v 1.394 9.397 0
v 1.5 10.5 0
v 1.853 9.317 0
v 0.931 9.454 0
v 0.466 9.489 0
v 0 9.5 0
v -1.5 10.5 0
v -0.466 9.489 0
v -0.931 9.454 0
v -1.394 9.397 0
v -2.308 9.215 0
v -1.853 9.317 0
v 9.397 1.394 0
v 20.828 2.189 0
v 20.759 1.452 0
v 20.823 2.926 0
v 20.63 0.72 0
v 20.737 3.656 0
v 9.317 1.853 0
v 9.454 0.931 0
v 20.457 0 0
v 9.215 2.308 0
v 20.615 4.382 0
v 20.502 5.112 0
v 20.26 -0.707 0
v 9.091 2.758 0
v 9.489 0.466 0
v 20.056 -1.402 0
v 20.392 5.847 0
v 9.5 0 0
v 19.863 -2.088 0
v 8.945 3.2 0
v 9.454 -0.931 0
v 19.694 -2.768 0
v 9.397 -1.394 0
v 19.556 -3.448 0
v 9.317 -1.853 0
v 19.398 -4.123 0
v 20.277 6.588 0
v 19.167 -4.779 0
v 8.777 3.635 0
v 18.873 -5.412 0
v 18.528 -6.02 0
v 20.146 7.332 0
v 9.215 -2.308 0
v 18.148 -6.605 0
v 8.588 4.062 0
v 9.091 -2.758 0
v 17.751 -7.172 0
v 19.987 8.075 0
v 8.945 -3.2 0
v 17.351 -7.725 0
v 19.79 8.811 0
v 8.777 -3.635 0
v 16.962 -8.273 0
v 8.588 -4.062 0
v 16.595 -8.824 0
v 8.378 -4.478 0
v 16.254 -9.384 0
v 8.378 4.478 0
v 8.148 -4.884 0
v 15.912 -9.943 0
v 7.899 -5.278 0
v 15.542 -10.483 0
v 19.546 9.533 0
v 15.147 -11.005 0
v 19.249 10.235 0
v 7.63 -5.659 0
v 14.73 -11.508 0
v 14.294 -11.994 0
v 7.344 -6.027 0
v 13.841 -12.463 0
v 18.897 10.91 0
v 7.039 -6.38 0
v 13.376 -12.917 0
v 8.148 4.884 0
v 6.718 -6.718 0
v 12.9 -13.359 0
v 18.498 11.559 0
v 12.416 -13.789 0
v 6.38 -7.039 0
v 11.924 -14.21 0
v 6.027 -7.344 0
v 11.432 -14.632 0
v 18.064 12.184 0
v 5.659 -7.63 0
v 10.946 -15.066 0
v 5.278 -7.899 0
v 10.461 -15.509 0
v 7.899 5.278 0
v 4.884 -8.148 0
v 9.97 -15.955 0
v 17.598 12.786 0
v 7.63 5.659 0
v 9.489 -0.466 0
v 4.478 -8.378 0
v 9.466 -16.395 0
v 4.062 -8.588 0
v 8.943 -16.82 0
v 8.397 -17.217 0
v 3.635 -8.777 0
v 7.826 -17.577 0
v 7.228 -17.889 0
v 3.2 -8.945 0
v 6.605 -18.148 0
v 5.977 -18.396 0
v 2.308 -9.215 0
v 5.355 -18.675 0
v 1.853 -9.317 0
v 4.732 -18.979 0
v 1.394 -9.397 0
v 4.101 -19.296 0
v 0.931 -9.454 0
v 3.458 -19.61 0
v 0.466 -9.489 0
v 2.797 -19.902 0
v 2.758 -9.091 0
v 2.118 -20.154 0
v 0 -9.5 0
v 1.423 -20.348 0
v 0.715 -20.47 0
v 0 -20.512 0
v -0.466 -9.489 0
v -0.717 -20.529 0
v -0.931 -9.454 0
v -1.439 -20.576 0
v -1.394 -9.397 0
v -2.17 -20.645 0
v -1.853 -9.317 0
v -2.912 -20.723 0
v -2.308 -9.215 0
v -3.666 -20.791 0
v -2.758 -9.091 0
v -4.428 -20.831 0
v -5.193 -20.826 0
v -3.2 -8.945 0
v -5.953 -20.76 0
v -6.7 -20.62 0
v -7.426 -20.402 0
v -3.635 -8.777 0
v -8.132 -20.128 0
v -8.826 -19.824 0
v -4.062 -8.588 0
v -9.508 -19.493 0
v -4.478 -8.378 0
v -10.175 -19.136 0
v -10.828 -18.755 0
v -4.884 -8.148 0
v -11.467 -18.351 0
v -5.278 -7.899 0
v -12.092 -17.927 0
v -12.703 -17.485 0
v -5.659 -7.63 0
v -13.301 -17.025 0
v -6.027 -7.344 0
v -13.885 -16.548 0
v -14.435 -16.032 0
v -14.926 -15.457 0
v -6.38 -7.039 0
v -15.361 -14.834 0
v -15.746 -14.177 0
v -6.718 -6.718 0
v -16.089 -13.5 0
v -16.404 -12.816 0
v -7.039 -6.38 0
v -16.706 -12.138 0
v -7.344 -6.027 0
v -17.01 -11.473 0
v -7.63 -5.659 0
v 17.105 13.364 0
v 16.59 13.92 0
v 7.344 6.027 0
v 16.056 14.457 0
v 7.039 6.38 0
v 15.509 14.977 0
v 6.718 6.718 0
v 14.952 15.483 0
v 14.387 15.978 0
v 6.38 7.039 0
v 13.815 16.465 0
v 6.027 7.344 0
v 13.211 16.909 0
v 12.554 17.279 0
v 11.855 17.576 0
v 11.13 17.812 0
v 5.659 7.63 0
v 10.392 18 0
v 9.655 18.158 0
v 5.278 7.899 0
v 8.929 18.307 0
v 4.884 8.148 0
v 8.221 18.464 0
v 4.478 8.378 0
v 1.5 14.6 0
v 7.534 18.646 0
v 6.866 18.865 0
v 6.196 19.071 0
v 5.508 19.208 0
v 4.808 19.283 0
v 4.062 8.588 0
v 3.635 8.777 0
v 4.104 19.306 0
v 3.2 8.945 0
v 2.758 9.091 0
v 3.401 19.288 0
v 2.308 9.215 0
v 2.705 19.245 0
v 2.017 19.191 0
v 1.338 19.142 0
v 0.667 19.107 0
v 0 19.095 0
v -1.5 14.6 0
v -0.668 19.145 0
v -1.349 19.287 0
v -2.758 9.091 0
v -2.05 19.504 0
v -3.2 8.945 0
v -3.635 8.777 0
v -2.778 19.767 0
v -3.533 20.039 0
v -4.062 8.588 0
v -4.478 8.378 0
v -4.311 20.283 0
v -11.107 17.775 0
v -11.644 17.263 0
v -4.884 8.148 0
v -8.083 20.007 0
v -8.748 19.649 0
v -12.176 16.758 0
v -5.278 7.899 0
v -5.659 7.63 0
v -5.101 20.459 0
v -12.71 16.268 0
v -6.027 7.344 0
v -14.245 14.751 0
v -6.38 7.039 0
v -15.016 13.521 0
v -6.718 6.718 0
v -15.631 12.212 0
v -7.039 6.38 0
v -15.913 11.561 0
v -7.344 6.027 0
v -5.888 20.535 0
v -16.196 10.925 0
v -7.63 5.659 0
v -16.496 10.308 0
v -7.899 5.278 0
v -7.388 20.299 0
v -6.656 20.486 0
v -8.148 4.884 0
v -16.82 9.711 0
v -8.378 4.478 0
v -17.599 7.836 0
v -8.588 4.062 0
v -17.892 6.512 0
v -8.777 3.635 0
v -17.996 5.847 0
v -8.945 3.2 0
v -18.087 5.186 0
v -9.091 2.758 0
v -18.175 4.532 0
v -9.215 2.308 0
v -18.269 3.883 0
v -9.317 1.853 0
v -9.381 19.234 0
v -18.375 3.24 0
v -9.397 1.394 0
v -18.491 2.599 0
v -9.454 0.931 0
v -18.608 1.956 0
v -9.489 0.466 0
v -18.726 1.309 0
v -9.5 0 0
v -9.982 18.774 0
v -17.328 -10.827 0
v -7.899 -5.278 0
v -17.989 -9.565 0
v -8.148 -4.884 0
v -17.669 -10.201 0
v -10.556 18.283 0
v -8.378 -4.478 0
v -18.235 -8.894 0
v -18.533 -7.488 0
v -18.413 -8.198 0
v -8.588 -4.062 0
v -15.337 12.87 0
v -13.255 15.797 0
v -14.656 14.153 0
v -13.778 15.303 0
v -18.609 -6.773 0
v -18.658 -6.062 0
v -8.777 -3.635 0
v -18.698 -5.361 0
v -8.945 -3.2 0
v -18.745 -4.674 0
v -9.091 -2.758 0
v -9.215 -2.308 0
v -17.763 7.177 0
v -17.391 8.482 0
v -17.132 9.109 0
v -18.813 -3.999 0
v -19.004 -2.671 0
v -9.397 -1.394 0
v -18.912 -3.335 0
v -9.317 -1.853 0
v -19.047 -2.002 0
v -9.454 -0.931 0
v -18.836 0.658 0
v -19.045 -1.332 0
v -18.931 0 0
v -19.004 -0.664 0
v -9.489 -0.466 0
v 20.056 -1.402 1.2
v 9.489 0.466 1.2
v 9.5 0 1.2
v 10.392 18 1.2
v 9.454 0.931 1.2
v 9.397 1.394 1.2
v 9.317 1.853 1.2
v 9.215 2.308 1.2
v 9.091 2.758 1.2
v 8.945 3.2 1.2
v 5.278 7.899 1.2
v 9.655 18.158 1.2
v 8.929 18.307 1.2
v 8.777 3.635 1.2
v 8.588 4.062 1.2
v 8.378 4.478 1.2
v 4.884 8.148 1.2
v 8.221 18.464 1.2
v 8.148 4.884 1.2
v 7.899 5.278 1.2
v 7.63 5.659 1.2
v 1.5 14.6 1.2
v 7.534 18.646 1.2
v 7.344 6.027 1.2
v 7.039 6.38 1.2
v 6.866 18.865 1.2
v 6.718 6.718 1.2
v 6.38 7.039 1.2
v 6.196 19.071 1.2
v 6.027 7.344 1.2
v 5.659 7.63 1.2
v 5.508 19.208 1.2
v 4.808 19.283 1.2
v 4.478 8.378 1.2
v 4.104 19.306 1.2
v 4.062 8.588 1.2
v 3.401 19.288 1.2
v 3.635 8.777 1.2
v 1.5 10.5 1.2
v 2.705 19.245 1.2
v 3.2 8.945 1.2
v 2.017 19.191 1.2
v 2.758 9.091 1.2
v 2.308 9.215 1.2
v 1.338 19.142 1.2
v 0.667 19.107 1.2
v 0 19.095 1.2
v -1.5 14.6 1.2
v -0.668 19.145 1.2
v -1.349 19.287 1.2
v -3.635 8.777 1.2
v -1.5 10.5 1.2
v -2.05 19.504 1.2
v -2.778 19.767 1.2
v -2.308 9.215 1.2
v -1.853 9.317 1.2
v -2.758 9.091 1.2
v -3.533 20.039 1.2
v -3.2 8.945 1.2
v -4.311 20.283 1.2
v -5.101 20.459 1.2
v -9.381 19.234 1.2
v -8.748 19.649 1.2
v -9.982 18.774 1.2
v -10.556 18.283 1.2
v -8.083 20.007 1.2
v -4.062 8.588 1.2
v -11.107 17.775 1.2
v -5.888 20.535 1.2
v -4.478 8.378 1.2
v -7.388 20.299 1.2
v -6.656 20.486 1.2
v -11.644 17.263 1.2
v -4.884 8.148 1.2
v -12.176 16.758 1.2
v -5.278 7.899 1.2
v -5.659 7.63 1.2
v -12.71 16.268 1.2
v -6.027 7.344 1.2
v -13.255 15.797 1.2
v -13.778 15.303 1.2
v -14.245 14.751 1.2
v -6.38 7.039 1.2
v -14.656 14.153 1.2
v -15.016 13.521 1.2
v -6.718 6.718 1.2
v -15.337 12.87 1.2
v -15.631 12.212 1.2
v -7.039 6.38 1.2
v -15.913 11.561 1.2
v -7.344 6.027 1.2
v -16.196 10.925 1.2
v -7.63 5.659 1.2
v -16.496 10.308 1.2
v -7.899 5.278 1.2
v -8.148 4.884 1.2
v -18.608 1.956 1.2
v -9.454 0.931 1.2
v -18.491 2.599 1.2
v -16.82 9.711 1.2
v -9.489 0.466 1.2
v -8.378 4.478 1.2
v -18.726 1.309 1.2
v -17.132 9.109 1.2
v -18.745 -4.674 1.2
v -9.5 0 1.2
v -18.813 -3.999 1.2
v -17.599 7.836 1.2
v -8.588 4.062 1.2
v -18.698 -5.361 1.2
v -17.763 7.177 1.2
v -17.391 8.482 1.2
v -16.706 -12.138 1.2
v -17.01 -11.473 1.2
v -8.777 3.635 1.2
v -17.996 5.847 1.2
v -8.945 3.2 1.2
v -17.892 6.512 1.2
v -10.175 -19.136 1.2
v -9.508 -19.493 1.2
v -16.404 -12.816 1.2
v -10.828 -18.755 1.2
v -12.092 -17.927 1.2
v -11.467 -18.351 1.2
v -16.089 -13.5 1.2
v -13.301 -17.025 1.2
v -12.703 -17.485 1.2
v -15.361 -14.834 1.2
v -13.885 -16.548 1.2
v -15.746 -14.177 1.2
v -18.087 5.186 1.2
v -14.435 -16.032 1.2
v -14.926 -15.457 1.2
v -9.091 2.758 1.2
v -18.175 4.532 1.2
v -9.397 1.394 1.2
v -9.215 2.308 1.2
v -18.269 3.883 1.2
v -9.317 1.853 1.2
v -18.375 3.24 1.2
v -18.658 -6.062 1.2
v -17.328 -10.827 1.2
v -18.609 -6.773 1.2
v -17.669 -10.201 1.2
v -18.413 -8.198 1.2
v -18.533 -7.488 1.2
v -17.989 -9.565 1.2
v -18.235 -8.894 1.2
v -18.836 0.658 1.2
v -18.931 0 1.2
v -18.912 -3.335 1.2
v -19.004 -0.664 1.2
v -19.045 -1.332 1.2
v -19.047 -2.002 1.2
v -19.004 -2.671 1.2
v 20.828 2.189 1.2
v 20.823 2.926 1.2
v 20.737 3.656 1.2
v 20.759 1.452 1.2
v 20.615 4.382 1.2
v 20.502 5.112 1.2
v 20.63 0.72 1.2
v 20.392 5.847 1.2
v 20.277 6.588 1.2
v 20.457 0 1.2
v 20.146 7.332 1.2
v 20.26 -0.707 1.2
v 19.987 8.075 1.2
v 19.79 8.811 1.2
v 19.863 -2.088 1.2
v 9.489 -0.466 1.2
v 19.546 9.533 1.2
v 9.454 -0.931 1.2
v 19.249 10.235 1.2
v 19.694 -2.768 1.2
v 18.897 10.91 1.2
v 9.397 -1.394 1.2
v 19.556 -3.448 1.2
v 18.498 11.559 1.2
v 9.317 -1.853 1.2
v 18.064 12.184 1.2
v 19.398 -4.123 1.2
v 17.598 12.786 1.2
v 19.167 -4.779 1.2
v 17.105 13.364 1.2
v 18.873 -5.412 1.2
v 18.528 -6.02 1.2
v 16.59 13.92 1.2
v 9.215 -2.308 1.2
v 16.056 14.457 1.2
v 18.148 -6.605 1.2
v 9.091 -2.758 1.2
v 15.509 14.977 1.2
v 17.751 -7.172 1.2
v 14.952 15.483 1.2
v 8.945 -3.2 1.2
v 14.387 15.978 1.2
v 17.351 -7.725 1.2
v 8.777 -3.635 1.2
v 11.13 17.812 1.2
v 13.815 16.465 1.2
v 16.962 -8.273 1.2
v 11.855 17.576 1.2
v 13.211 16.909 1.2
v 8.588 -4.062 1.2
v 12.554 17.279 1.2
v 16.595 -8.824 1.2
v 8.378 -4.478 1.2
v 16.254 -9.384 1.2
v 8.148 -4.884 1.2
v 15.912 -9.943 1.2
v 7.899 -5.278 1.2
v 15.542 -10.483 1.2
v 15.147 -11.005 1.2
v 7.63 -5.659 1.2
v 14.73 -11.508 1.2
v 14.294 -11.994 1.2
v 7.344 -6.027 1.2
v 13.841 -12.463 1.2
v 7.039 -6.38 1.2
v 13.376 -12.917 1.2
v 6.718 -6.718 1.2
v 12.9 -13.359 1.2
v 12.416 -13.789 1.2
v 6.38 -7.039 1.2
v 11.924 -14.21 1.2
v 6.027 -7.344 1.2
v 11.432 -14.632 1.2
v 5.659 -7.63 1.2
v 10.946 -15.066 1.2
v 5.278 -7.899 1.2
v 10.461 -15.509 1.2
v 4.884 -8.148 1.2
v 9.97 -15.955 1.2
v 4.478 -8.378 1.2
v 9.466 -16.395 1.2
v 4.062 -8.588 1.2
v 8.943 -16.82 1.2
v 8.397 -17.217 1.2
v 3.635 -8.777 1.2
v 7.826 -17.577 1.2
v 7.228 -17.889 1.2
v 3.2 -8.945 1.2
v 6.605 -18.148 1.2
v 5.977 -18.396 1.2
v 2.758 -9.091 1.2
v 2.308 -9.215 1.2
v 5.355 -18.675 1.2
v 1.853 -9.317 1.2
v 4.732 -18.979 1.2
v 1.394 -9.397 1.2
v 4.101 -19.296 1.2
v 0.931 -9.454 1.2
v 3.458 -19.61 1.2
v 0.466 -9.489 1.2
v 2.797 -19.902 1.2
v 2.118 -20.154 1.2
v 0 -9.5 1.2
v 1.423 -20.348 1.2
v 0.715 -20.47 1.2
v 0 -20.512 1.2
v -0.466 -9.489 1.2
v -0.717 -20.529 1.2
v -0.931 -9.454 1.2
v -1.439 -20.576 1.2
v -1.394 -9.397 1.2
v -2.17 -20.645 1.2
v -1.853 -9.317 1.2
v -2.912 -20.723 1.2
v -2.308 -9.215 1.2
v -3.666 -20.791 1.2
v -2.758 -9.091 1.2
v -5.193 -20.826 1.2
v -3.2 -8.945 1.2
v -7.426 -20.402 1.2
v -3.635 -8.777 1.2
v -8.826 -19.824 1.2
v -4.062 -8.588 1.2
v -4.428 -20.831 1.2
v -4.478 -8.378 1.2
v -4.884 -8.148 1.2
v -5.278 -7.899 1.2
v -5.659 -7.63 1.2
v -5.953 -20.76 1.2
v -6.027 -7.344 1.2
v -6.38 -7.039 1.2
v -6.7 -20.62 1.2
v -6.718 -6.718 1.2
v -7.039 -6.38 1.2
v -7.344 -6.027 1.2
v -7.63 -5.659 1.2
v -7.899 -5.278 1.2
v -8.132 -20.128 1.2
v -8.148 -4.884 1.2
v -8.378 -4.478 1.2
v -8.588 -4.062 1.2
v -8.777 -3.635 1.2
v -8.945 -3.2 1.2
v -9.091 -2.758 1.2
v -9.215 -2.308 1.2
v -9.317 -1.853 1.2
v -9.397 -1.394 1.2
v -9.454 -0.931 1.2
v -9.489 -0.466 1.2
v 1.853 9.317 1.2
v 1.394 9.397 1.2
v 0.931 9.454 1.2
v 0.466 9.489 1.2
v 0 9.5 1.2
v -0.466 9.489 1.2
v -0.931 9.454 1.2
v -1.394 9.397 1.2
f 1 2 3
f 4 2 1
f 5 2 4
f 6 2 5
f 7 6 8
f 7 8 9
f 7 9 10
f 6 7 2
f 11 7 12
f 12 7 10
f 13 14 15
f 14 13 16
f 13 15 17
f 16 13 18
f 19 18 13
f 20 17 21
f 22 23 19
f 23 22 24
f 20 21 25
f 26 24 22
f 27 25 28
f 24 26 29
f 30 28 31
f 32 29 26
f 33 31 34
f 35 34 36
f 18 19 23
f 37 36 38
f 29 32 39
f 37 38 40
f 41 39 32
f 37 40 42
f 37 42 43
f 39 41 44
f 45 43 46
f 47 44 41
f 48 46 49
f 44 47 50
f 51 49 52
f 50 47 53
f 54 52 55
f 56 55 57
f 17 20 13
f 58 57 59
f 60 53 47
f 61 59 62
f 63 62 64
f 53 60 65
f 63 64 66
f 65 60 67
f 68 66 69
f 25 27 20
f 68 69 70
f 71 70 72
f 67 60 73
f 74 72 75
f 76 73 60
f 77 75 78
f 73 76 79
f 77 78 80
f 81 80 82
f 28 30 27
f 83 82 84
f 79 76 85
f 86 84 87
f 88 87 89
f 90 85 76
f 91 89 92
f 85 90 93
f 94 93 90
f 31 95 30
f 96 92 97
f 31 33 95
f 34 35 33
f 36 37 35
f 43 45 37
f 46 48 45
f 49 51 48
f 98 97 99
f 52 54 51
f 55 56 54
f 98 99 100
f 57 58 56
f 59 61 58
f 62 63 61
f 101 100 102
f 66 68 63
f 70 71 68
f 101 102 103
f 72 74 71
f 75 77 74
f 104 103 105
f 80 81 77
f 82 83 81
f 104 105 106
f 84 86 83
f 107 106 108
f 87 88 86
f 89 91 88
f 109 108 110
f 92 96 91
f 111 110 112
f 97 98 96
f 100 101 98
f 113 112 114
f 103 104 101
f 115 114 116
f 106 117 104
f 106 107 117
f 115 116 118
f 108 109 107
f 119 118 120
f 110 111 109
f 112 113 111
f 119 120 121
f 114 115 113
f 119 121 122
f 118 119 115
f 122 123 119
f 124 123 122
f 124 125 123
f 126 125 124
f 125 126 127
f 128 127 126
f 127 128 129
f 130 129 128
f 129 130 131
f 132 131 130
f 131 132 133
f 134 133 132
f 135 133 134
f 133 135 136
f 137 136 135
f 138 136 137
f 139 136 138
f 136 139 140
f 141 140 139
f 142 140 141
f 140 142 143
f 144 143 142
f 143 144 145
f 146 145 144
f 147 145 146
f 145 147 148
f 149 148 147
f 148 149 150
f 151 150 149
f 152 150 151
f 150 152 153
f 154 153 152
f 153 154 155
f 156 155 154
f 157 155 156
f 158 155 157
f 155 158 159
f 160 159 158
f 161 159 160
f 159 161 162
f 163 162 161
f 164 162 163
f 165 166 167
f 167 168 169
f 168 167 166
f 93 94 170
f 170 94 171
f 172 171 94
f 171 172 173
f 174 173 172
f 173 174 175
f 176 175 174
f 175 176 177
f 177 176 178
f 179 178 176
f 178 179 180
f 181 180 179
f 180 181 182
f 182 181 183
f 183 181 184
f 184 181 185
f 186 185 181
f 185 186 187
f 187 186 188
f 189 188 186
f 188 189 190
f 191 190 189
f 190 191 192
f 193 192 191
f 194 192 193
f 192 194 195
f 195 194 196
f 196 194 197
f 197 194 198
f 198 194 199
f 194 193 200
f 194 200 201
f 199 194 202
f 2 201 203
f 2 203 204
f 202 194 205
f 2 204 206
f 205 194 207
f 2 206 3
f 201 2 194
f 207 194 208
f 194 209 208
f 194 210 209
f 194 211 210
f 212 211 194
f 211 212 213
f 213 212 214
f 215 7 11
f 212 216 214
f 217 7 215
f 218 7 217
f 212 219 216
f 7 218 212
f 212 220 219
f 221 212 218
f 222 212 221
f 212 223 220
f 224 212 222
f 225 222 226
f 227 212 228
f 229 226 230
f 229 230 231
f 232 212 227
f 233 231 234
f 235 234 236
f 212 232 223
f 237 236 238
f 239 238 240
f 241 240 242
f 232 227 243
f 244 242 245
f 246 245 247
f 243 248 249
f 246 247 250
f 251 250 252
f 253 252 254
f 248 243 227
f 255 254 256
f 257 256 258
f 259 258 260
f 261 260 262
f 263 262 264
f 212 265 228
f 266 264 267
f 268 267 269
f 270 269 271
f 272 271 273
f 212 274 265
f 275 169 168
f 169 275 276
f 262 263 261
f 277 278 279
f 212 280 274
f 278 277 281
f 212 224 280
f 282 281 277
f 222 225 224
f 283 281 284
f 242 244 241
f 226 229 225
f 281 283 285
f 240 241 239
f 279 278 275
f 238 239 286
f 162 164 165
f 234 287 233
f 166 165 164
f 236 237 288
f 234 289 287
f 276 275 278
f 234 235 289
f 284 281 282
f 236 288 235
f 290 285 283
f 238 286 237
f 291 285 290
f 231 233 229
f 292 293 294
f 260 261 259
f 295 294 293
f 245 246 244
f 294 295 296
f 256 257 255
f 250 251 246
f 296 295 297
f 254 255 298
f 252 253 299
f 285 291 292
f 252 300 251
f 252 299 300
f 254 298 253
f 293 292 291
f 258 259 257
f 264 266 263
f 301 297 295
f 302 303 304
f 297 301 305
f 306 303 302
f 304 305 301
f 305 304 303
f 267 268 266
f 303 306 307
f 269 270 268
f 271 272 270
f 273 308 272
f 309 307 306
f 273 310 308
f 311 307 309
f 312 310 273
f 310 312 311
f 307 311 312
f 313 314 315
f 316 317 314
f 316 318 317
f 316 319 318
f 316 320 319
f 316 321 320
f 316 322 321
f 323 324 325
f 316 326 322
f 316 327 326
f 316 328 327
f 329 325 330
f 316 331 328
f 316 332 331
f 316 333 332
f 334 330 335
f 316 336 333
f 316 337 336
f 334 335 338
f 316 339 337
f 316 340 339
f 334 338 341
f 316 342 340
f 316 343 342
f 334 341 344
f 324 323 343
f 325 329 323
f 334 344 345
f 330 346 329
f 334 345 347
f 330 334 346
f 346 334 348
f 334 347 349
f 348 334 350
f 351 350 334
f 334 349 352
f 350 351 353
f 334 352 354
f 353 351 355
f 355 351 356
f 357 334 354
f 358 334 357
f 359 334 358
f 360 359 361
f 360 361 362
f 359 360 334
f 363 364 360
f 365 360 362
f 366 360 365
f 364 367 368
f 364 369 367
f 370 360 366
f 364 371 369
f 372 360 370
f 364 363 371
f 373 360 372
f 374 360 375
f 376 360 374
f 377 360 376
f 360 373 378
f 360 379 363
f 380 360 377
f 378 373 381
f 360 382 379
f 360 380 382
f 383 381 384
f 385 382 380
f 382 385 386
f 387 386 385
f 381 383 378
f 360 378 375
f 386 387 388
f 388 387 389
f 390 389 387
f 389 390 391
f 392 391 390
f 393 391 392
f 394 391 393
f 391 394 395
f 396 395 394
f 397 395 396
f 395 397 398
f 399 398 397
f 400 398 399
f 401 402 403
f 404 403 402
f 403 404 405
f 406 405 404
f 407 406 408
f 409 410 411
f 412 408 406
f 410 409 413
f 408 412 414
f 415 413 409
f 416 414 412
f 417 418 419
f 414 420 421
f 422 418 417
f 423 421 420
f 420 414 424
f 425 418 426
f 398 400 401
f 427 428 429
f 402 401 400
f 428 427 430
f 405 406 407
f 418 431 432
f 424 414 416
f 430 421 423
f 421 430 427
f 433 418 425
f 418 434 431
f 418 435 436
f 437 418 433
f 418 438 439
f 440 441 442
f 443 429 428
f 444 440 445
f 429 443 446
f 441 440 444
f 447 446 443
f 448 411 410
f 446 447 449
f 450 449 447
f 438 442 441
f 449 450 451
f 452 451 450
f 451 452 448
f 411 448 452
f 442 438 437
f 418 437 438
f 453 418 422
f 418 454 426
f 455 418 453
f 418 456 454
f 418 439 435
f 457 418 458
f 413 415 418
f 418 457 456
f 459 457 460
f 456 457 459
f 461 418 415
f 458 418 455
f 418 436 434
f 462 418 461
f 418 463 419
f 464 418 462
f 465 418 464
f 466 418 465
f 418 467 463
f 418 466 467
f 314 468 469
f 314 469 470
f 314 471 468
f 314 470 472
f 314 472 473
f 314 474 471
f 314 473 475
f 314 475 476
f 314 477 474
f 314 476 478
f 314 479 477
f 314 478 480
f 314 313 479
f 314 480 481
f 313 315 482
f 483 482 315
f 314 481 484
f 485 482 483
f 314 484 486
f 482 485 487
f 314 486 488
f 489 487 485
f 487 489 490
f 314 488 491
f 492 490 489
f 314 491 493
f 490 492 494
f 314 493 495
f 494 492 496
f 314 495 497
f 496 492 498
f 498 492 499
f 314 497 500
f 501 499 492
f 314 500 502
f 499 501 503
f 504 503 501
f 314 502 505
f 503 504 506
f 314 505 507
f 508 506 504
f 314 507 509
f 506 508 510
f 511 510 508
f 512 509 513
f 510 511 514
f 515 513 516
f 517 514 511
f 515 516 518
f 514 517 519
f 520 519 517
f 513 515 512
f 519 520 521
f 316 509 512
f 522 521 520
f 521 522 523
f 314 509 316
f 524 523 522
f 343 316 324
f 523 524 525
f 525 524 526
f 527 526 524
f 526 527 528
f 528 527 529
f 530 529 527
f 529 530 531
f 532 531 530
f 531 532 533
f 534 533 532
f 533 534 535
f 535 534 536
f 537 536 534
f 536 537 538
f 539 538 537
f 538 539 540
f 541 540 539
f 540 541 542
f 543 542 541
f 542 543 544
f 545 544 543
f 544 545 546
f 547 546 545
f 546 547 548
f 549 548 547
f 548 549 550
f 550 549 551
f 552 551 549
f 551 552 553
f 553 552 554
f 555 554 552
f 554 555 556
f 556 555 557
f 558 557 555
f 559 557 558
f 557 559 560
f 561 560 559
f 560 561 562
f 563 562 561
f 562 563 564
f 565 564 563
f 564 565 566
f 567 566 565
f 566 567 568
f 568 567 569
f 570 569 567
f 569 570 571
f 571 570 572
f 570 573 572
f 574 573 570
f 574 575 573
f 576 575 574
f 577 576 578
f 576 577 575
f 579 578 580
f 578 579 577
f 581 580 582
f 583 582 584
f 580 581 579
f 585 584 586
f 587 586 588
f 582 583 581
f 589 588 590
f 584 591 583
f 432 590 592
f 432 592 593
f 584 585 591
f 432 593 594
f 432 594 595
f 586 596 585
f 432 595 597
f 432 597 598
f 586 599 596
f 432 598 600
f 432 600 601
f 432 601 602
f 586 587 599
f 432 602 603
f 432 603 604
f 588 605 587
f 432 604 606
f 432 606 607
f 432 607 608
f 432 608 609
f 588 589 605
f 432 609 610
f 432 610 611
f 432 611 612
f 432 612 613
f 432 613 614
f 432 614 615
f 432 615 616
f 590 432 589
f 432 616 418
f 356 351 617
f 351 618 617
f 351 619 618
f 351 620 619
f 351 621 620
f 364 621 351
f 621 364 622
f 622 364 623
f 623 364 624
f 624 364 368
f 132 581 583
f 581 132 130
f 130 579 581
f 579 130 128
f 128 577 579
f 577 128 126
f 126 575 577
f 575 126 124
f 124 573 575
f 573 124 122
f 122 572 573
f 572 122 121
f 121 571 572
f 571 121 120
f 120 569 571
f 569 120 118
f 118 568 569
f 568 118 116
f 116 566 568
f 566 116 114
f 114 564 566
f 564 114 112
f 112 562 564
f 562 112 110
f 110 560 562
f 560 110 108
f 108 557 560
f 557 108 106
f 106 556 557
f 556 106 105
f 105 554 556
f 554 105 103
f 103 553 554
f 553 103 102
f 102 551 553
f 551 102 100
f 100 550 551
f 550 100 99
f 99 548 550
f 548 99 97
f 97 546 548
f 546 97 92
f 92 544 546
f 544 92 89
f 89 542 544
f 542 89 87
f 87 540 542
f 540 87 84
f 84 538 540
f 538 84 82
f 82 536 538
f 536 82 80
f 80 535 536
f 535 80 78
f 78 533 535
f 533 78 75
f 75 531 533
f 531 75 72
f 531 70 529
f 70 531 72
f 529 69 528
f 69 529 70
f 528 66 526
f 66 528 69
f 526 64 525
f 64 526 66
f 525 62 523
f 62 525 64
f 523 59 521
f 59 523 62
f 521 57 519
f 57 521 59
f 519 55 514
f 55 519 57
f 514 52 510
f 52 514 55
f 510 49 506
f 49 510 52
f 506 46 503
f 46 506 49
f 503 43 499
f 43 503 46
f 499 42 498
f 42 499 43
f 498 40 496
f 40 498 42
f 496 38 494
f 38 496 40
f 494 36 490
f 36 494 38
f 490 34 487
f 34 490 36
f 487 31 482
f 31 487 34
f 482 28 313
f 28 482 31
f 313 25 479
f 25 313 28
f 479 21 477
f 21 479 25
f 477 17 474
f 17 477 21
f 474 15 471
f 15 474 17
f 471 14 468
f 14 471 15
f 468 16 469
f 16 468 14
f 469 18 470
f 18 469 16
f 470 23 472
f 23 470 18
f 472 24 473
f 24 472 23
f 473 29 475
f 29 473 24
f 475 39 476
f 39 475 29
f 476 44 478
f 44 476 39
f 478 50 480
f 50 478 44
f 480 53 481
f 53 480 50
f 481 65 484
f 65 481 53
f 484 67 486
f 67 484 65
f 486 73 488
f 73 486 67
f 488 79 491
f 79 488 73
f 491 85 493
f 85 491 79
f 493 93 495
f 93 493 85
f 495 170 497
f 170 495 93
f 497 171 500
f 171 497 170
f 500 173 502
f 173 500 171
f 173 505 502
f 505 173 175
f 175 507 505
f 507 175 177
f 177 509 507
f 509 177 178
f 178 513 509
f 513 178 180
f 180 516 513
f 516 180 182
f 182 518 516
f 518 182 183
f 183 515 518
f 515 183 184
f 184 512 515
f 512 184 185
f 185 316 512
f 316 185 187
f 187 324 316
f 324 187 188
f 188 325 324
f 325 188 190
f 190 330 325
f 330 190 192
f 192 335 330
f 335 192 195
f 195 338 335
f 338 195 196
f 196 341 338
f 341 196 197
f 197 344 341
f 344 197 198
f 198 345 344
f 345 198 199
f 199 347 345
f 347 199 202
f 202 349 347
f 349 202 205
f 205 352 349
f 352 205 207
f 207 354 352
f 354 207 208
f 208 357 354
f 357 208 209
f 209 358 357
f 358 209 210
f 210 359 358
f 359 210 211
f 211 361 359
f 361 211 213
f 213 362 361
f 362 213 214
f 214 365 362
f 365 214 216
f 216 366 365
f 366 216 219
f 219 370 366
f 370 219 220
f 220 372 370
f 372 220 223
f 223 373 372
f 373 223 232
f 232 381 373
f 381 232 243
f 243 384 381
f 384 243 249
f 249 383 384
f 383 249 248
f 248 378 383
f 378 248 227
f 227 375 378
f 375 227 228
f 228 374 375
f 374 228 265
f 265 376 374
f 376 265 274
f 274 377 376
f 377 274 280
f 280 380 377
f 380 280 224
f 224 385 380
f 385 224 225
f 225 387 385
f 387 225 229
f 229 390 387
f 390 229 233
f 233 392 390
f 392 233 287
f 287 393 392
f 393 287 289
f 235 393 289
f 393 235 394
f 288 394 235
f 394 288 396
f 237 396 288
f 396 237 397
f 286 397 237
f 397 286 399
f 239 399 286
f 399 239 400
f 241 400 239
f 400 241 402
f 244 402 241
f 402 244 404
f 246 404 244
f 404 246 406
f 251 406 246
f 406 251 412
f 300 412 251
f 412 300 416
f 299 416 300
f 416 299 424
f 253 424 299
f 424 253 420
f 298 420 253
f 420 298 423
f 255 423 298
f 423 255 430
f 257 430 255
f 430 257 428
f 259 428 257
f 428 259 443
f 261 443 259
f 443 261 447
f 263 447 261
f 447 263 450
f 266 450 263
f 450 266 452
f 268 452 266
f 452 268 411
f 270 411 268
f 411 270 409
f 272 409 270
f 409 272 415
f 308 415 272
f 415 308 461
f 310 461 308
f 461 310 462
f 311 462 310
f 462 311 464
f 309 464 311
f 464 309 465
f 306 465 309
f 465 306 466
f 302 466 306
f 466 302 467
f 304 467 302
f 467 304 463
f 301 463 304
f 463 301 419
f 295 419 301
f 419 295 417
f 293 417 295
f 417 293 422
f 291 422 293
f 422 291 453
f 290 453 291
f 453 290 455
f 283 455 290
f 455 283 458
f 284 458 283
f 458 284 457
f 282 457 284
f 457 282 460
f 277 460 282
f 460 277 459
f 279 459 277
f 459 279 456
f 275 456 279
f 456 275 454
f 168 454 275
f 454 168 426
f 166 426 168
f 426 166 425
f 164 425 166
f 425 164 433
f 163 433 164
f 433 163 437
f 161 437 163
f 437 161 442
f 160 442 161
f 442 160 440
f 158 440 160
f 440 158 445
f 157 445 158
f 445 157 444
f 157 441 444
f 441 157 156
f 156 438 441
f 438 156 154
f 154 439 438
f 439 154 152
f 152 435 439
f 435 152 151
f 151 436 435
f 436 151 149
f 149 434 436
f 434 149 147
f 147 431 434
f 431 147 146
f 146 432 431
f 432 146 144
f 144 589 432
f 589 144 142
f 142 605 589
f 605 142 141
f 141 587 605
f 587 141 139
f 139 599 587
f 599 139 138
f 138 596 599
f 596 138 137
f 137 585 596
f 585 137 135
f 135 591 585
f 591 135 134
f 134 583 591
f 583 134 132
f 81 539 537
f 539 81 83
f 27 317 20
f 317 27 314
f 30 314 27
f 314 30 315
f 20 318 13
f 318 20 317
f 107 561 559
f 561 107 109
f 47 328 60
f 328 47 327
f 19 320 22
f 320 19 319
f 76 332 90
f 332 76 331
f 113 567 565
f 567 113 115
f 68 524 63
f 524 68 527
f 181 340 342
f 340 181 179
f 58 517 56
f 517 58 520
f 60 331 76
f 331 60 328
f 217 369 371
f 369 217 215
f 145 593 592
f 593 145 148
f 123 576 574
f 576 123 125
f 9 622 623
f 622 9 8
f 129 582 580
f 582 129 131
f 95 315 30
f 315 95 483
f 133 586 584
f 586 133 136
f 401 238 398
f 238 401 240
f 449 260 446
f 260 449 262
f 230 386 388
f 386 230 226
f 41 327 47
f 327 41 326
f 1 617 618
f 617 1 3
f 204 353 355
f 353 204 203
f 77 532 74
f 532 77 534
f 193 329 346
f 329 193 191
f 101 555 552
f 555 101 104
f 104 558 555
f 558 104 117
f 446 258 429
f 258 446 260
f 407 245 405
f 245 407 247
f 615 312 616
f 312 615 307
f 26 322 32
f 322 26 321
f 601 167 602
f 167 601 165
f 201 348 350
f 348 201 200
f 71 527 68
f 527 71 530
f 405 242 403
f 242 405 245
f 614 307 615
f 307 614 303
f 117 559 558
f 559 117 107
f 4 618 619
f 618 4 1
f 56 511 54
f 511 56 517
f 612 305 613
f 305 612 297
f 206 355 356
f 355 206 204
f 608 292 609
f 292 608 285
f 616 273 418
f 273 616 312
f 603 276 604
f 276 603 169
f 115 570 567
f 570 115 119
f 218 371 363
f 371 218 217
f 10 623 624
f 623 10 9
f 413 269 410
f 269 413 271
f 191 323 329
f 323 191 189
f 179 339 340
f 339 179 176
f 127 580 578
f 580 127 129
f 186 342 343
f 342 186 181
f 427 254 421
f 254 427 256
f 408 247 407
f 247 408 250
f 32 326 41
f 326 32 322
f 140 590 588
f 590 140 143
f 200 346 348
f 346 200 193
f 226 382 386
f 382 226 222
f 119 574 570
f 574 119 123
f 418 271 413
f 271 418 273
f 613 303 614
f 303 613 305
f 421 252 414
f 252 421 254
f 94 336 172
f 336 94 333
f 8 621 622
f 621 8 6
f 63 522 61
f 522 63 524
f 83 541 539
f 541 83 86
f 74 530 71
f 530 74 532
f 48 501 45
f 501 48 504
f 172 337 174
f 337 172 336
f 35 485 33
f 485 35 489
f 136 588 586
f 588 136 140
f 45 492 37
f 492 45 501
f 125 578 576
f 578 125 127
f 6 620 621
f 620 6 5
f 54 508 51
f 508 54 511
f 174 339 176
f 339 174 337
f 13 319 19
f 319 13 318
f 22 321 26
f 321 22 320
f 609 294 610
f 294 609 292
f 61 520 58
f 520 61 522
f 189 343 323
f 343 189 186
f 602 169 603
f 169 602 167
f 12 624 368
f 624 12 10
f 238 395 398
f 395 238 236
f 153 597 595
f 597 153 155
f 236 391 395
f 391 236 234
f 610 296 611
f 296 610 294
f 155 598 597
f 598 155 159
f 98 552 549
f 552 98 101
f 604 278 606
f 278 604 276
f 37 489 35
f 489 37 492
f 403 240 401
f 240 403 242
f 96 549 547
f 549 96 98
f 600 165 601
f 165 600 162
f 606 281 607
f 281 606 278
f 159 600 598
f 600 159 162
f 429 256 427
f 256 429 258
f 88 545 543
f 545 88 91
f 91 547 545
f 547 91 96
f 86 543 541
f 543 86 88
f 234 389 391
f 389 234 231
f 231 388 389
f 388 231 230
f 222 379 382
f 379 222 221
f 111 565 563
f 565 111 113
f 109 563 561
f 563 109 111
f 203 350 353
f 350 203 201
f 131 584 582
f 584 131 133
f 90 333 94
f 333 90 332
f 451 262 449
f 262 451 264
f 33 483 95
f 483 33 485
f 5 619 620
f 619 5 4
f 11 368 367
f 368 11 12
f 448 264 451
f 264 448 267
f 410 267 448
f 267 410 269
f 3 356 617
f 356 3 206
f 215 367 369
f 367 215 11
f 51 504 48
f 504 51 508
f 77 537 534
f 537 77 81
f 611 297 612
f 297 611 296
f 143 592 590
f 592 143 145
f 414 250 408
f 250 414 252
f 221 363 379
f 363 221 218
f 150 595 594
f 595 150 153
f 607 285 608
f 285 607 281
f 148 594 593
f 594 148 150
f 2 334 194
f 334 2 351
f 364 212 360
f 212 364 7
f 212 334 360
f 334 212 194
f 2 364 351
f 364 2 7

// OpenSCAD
/*
  Elna Supermatic cam 14
  Name: Loop wave
  Status: candidate

  Generated from measured parametric base v2.
  Surface mode: smooth
*/

include <_elna_measured_common.scad>;

profile_points = [
        [0.0000, 19.0950],
        [0.6672, 19.1074],
        [1.3385, 19.1419],
        [2.0171, 19.1915],
        [2.7047, 19.2448],
        [3.4010, 19.2880],
        [4.1036, 19.3058],
        [4.8079, 19.2835],
        [5.5079, 19.2082],
        [6.1964, 19.0706],
        [6.8664, 18.8653],
        [7.5336, 18.6463],
        [8.2207, 18.4640],
        [8.9288, 18.3067],
        [9.6549, 18.1583],
        [10.3922, 17.9999],
        [11.1301, 17.8119],
        [11.8554, 17.5764],
        [12.5537, 17.2787],
        [13.2111, 16.9094],
        [13.8154, 16.4646],
        [14.3870, 15.9784],
        [14.9520, 15.4832],
        [15.5093, 14.9771],
        [16.0564, 14.4572],
        [16.5898, 13.9205],
        [17.1054, 13.3642],
        [17.5982, 12.7859],
        [18.0637, 12.1841],
        [18.4976, 11.5586],
        [18.8967, 10.9100],
        [19.2494, 10.2351],
        [19.5462, 9.5333],
        [19.7899, 8.8110],
        [19.9867, 8.0752],
        [20.1456, 7.3324],
        [20.2771, 6.5884],
        [20.3925, 5.8474],
        [20.5022, 5.1118],
        [20.6151, 4.3819],
        [20.7371, 3.6565],
        [20.8230, 2.9265],
        [20.8278, 2.1891],
        [20.7592, 1.4516],
        [20.6302, 0.7204],
        [20.4575, 0.0000],
        [20.2599, -0.7075],
        [20.0561, -1.4025],
        [19.8631, -2.0877],
        [19.6938, -2.7678],
        [19.5563, -3.4483],
        [19.3980, -4.1232],
        [19.1671, -4.7789],
        [18.8728, -5.4117],
        [18.5279, -6.0201],
        [18.1483, -6.6054],
        [17.7506, -7.1717],
        [17.3507, -7.7250],
        [16.9621, -8.2730],
        [16.5947, -8.8236],
        [16.2536, -9.3840],
        [15.9116, -9.9427],
        [15.5421, -10.4833],
        [15.1473, -11.0051],
        [14.7300, -11.5084],
        [14.2936, -11.9938],
        [13.8413, -12.4628],
        [13.3761, -12.9171],
        [12.9004, -13.3587],
        [12.4159, -13.7893],
        [11.9237, -14.2101],
        [11.4320, -14.6323],
        [10.9462, -15.0662],
        [10.4610, -15.5090],
        [9.9697, -15.9548],
        [9.4657, -16.3952],
        [8.9431, -16.8196],
        [8.3973, -17.2171],
        [7.8257, -17.5767],
        [7.2278, -17.8894],
        [6.6054, -18.1483],
        [5.9771, -18.3957],
        [5.3549, -18.6749],
        [4.7320, -18.9791],
        [4.1015, -19.2962],
        [3.4578, -19.6100],
        [2.7971, -19.9022],
        [2.1183, -20.1539],
        [1.4229, -20.3478],
        [0.7148, -20.4702],
        [0.0000, -20.5120],
        [-0.7169, -20.5288],
        [-1.4388, -20.5762],
        [-2.1699, -20.6454],
        [-2.9124, -20.7226],
        [-3.6660, -20.7908],
        [-4.4278, -20.8314],
        [-5.1926, -20.8263],
        [-5.9528, -20.7599],
        [-6.7000, -20.6205],
        [-7.4256, -20.4017],
        [-8.1321, -20.1276],
        [-8.8264, -19.8245],
        [-9.5076, -19.4935],
        [-10.1750, -19.1364],
        [-10.8283, -18.7551],
        [-11.4673, -18.3515],
        [-12.0922, -17.9275],
        [-12.7035, -17.4848],
        [-13.3012, -17.0247],
        [-13.8855, -16.5481],
        [-14.4349, -16.0316],
        [-14.9265, -15.4568],
        [-15.3614, -14.8343],
        [-15.7456, -14.1774],
        [-16.0888, -13.5001],
        [-16.4042, -12.8164],
        [-16.7063, -12.1378],
        [-17.0098, -11.4732],
        [-17.3276, -10.8275],
        [-17.6695, -10.2015],
        [-17.9889, -9.5649],
        [-18.2352, -8.8939],
        [-18.4133, -8.1981],
        [-18.5333, -7.4879],
        [-18.6092, -6.7732],
        [-18.6581, -6.0624],
        [-18.6976, -5.3615],
        [-18.7447, -4.6736],
        [-18.8130, -3.9988],
        [-18.9122, -3.3347],
        [-19.0039, -2.6708],
        [-19.0470, -2.0019],
        [-19.0452, -1.3318],
        [-19.0041, -0.6636],
        [-18.9315, -0.0000],
        [-18.8358, 0.6578],
        [-18.7256, 1.3094],
        [-18.6085, 1.9558],
        [-18.4906, 2.5987],
        [-18.3755, 3.2401],
        [-18.2695, 3.8833],
        [-18.1754, 4.5316],
        [-18.0873, 5.1865],
        [-17.9965, 5.8474],
        [-17.8922, 6.5122],
        [-17.7633, 7.1769],
        [-17.5992, 7.8357],
        [-17.3909, 8.4821],
        [-17.1321, 9.1093],
        [-16.8199, 9.7110],
        [-16.4957, 10.3076],
        [-16.1965, 10.9247],
        [-15.9127, 11.5612],
        [-15.6312, 12.2124],
        [-15.3374, 12.8696],
        [-15.0165, 13.5210],
        [-14.6557, 14.1529],
        [-14.2450, 14.7511],
        [-13.7785, 15.3026],
        [-13.2549, 15.7966],
        [-12.7103, 16.2685],
        [-12.1758, 16.7585],
        [-11.6442, 17.2632],
        [-11.1071, 17.7750],
        [-10.5558, 18.2831],
        [-9.9824, 18.7742],
        [-9.3811, 19.2340],
        [-8.7482, 19.6488],
        [-8.0833, 20.0068],
        [-7.3883, 20.2992],
        [-6.6564, 20.4864],
        [-5.8883, 20.5351],
        [-5.1010, 20.4590],
        [-4.3112, 20.2827],
        [-3.5335, 20.0394],
        [-2.7781, 19.7669],
        [-2.0500, 19.5043],
        [-1.3487, 19.2873],
        [-0.6685, 19.1447]
];

icon_points = [[-1.000,0.500], [-0.956,0.599], [-0.911,0.691], [-0.867,0.768], [-0.822,0.824], [-0.778,0.855], [-0.733,0.858], [-0.689,0.834], [-0.644,0.784], [-0.600,0.712], [-0.556,0.623], [-0.511,0.525], [-0.467,0.425], [-0.422,0.331], [-0.378,0.250], [-0.333,0.188], [-0.289,0.151], [-0.244,0.140], [-0.200,0.158], [-0.156,0.202], [-0.111,0.269], [-0.067,0.354], [-0.022,0.450], [0.022,0.550], [0.067,0.646], [0.111,0.731], [0.156,0.798], [0.200,0.842], [0.244,0.860], [0.289,0.849], [0.333,0.812], [0.378,0.750], [0.422,0.669], [0.467,0.575], [0.511,0.475], [0.556,0.377], [0.600,0.288], [0.644,0.216], [0.689,0.166], [0.733,0.142], [0.778,0.145], [0.822,0.176], [0.867,0.232], [0.911,0.309], [0.956,0.401], [1.000,0.500]];

elna_cam_ring(profile_points=profile_points);
